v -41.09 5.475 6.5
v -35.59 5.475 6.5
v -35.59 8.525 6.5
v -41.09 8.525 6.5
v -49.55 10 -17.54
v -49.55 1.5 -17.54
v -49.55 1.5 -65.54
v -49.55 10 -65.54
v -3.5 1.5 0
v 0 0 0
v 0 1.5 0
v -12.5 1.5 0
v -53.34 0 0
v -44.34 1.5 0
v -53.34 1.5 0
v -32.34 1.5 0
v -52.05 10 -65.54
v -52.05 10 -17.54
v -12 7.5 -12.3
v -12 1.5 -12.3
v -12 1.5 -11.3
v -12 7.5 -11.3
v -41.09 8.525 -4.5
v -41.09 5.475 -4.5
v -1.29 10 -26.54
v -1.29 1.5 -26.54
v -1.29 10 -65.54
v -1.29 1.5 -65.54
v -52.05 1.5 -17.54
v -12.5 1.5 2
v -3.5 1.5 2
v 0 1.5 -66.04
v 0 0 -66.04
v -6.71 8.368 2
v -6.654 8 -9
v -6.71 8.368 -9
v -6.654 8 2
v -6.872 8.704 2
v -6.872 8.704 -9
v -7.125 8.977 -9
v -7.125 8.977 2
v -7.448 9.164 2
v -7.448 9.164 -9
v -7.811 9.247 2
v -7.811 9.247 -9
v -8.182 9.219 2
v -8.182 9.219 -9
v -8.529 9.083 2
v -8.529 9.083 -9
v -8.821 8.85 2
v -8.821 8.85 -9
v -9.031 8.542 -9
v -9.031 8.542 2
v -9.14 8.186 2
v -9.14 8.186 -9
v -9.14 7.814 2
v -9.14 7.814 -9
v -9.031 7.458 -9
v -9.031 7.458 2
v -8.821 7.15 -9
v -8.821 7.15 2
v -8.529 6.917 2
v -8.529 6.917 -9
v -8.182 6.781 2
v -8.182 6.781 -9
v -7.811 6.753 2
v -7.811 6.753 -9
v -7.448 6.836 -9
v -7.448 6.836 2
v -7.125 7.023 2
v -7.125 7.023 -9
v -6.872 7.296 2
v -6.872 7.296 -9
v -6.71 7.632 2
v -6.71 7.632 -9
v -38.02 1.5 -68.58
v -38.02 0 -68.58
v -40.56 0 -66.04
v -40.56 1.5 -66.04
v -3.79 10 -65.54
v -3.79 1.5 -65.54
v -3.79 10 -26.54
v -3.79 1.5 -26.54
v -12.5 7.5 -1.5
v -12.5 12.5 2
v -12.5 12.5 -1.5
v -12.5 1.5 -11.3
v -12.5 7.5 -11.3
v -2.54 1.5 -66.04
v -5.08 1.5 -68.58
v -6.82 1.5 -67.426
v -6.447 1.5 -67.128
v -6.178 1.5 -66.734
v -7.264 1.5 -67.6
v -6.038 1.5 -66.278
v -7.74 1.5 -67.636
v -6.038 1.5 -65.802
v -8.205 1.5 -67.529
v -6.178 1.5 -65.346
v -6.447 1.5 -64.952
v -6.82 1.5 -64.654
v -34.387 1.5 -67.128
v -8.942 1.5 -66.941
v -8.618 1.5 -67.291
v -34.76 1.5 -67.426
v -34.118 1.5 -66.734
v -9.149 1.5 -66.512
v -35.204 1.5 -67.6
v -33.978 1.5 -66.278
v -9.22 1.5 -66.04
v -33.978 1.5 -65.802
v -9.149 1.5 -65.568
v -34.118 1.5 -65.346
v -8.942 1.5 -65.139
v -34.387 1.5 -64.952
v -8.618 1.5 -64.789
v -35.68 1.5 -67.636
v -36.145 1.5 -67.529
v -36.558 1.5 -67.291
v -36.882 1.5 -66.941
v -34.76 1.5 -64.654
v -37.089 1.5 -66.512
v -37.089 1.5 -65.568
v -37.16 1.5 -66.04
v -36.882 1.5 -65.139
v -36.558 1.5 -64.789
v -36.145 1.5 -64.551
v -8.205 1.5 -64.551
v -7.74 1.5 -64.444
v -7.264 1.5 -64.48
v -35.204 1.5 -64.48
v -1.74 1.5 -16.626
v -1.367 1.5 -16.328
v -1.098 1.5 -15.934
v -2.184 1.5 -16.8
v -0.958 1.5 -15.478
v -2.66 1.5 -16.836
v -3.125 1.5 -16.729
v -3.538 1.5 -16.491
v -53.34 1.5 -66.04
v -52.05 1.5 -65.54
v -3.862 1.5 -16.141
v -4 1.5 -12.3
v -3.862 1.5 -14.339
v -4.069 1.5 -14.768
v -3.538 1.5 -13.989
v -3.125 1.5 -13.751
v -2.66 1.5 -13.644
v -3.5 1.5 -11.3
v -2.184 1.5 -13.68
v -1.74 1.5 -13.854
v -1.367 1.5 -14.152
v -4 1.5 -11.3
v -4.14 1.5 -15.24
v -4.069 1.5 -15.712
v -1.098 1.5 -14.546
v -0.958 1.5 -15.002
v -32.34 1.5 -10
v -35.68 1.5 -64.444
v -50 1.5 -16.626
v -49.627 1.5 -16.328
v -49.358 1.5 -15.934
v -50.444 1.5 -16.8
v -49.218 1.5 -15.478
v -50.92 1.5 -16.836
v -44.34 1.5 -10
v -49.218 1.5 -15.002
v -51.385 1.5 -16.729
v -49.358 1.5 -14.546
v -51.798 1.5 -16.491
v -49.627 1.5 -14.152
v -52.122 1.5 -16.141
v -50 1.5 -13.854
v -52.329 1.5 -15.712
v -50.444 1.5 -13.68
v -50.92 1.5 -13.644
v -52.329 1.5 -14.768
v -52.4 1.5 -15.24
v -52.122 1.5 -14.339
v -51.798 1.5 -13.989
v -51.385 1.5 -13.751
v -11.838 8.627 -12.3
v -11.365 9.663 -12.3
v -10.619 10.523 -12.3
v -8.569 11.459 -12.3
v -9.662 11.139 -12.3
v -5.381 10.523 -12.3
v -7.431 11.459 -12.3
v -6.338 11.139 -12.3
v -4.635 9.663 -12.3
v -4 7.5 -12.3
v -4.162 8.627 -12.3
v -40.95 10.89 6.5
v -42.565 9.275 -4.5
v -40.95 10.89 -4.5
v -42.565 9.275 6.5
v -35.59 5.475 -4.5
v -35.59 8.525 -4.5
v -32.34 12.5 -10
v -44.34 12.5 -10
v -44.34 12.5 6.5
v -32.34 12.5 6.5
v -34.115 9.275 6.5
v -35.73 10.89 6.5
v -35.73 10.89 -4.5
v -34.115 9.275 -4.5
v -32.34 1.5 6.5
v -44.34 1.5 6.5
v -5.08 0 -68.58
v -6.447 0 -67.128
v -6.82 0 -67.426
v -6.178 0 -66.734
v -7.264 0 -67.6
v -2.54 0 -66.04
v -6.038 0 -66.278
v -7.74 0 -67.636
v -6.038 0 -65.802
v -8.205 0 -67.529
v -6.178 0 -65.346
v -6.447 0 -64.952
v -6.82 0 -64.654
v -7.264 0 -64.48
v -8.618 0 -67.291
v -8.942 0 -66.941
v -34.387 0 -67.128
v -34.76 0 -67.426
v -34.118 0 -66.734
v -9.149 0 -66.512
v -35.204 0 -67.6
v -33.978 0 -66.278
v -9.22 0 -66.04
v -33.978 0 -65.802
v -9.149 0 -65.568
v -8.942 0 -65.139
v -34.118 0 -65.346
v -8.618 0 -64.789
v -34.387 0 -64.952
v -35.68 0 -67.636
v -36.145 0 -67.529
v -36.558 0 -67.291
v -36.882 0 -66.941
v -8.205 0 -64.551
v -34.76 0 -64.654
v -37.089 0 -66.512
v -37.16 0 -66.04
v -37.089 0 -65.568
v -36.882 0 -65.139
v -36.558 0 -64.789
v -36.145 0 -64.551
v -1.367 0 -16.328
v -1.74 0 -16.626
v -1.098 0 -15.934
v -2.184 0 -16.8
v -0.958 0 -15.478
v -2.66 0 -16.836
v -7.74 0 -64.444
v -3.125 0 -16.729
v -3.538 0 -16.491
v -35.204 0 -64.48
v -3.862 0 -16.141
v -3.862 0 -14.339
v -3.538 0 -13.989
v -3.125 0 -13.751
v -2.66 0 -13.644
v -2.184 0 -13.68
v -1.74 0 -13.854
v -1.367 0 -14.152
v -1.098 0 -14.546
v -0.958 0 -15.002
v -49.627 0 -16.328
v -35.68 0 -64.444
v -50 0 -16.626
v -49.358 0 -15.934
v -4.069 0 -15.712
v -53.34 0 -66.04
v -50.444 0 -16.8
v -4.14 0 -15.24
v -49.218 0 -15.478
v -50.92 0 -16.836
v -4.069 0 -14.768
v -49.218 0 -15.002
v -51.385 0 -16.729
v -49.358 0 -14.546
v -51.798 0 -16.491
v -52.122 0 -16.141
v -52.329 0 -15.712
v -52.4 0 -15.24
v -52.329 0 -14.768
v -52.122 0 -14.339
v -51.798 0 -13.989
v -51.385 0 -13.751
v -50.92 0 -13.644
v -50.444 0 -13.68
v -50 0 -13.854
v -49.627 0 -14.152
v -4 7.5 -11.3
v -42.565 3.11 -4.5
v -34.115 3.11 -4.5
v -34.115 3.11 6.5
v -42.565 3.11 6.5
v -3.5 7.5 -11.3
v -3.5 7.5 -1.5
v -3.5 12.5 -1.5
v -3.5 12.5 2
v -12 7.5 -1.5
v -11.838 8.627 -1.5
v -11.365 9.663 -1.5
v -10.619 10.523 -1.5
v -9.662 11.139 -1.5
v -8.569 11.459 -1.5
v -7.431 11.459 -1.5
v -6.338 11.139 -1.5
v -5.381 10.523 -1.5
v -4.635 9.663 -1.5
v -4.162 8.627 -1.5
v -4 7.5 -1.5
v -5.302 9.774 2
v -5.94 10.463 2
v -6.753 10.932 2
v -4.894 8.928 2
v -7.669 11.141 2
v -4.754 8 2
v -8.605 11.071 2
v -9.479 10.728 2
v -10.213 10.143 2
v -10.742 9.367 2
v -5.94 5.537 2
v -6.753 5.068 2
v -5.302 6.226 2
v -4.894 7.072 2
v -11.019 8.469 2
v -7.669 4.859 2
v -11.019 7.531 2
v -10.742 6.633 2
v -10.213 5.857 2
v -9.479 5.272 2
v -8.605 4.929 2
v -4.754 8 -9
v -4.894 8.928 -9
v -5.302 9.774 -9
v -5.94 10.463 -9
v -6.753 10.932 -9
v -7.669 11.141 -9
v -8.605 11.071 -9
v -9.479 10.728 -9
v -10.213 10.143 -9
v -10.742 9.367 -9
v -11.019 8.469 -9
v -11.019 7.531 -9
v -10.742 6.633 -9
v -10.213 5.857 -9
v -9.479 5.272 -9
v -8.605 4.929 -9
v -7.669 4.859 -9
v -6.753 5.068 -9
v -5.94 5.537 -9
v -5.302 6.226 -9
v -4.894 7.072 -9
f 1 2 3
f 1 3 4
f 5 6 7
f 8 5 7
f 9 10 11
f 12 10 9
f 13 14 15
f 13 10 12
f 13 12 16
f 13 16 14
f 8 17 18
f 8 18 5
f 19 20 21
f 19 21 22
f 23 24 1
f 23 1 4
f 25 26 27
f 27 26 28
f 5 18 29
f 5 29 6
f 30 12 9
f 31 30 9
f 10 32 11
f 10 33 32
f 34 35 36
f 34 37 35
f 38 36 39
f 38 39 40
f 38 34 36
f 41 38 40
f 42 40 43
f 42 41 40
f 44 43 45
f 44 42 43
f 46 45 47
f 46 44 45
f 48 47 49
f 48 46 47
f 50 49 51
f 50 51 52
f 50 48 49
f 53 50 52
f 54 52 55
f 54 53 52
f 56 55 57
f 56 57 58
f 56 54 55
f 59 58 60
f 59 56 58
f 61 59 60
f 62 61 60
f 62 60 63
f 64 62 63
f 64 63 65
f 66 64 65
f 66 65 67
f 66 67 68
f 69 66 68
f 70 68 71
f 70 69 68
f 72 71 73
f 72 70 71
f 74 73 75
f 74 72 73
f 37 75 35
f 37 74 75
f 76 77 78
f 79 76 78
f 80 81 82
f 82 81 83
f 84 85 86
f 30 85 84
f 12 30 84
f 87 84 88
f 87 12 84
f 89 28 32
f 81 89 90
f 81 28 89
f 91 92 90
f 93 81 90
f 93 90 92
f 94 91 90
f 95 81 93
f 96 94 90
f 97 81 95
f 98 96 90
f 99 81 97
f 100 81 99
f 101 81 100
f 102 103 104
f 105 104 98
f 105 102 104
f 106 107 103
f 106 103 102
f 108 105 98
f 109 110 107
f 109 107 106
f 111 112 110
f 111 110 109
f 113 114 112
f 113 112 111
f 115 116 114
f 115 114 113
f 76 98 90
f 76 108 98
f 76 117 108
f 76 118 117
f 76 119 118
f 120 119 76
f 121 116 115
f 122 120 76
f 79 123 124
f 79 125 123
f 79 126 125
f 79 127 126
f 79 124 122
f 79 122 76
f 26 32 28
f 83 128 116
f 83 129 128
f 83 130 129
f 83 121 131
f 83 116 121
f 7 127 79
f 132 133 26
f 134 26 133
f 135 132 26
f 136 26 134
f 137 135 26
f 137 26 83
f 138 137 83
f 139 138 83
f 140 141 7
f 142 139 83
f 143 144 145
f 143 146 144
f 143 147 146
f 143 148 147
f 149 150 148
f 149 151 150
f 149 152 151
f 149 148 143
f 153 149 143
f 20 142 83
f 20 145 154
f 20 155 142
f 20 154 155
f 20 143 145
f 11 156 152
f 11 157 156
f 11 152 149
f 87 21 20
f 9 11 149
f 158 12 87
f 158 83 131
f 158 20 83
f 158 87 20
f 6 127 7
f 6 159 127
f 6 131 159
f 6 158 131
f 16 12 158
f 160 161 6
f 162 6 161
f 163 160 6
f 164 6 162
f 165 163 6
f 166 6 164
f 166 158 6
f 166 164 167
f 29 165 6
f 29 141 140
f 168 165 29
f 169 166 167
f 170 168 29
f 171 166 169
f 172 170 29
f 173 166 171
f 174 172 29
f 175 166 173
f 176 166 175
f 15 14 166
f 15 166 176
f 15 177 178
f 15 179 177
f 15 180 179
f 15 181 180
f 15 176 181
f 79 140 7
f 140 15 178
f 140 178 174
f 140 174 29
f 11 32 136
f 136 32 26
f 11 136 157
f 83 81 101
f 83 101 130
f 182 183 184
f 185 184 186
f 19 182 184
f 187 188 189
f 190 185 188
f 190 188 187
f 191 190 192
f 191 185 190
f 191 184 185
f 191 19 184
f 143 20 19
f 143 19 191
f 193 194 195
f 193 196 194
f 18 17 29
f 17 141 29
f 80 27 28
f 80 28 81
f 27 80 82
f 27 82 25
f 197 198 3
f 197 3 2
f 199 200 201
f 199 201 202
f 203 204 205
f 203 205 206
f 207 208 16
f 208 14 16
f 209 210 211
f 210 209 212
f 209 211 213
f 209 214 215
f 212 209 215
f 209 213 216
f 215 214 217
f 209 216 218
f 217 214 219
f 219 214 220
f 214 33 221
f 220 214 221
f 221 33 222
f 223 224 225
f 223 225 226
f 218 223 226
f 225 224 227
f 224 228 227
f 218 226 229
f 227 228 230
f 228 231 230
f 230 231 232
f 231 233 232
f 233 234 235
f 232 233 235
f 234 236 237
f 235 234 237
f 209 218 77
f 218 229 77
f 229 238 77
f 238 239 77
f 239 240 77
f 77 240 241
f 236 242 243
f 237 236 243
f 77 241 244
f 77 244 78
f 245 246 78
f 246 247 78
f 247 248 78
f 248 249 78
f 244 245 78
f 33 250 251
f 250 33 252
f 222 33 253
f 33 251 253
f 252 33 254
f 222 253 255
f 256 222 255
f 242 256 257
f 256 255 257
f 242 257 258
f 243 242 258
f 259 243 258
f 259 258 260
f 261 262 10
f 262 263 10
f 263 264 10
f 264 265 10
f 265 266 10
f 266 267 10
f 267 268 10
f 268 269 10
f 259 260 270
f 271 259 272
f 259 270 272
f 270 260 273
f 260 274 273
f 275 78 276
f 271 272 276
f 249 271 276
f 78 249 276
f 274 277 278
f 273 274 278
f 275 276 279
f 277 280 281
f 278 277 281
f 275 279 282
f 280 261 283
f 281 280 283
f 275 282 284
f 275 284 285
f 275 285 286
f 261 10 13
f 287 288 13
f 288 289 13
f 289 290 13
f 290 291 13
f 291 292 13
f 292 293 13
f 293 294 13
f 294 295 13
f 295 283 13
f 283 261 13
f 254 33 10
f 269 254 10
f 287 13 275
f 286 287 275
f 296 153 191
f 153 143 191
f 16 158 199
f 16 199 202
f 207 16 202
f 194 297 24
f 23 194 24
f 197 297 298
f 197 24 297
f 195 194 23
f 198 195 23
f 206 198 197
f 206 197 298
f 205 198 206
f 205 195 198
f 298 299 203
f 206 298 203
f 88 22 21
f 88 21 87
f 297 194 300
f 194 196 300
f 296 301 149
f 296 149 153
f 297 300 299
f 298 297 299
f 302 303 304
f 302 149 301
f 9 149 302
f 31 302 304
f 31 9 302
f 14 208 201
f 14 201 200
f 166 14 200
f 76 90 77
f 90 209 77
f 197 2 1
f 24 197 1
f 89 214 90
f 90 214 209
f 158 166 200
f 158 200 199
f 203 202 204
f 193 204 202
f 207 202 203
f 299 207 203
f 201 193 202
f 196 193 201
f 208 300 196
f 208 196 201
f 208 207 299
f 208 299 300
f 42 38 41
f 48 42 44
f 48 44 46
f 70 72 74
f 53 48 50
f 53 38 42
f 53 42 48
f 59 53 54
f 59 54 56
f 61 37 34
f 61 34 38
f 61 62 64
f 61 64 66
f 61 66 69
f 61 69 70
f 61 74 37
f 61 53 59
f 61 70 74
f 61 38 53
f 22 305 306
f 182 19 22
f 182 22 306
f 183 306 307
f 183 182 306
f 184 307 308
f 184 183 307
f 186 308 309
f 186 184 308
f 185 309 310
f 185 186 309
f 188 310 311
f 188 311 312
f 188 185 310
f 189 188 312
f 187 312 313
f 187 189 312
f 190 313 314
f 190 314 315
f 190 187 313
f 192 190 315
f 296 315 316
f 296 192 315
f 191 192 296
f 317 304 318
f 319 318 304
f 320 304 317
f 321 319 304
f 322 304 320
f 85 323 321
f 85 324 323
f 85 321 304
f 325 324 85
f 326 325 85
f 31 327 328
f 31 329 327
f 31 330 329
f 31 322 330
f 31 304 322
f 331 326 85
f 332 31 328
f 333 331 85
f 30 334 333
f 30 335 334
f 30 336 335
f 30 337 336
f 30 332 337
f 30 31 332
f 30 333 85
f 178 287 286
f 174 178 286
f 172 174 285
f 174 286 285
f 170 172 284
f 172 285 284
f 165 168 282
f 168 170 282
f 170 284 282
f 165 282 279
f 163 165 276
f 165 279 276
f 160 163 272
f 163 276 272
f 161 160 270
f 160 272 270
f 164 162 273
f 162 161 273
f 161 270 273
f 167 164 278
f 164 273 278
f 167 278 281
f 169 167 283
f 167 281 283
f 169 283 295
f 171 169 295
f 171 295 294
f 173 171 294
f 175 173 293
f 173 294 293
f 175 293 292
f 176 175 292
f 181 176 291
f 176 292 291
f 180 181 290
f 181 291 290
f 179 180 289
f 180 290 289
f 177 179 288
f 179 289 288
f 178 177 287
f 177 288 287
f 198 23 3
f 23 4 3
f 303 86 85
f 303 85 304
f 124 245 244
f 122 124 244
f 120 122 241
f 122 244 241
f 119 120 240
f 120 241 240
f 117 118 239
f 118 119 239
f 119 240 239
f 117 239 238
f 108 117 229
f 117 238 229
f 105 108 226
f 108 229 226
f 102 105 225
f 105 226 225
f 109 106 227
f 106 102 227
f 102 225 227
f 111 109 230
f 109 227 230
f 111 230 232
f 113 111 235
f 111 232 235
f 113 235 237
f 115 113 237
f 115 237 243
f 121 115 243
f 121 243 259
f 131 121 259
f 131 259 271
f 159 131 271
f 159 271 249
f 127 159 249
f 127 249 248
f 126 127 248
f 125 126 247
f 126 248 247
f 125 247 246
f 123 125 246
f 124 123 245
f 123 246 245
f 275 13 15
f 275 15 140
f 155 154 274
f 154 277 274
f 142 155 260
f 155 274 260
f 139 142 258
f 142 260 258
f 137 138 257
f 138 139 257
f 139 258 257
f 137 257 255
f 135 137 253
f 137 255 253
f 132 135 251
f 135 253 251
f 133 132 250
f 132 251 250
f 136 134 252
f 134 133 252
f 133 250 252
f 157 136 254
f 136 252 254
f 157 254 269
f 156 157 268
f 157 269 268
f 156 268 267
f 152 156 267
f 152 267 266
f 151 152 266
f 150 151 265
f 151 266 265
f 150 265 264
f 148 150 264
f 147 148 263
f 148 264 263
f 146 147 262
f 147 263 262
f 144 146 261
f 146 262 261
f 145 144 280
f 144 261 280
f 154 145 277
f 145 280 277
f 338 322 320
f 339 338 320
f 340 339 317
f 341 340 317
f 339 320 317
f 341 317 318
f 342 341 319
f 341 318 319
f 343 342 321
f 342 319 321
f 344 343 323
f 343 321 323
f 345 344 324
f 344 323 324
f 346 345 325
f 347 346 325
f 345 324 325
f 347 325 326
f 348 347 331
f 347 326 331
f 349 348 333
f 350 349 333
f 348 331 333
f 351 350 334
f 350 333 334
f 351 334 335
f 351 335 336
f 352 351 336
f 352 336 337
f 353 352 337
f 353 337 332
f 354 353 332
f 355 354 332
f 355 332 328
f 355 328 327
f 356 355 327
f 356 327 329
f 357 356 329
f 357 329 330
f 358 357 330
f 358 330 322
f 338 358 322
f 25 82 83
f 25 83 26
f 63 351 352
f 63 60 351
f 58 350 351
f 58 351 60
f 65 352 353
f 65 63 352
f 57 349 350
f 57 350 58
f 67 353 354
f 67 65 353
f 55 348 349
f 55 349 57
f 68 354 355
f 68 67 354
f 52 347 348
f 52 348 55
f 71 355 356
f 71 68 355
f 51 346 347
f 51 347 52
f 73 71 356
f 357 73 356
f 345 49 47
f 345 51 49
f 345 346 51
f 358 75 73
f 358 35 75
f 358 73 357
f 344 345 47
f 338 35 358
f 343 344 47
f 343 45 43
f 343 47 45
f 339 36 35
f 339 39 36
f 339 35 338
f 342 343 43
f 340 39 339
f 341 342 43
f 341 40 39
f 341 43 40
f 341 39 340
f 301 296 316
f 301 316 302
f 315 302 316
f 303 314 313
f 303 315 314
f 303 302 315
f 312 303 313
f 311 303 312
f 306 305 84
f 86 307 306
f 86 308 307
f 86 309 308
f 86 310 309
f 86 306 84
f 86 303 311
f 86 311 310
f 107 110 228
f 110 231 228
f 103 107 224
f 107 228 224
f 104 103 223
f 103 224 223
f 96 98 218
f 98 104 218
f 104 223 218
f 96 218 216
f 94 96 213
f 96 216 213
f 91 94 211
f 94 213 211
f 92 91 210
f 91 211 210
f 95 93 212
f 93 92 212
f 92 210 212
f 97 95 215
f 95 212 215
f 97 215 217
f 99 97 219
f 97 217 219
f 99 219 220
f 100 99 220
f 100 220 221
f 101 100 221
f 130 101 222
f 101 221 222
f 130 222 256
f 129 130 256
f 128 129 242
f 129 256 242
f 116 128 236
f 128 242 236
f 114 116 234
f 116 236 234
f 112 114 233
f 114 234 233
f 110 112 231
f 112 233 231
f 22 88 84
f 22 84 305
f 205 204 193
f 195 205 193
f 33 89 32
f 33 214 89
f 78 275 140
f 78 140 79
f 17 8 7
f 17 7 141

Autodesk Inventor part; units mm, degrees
ref_plane "YZ Plane" through (0, 0, 0) normal (1, 0, 0) x (0, 1, 0)
ref_plane "XZ Plane" through (0, 0, 0) normal (0, 1, 0) x (-1, 0, 0)
ref_plane "XY Plane" through (0, 0, 0) normal (0, 0, 1) x (1, 0, 0)
sketch "Sketch1" plane through (0, 0, 0) normal (0, 1, 0) x (-1, 0, 0)
  line L0 (0, 0) -> (53.34, 0)
  line L1 (53.34, 0) -> (53.34, -66.04)
  line L2 (0, -66.04) -> (0, 0)
  circle A0 centre (50.8, -15.24) radius 1.6
  circle A1 centre (2.54, -15.24) radius 1.6
  circle A2 centre (35.56, -66.04) radius 1.6
  circle A3 centre (7.62, -66.04) radius 1.6
  line L3 (2.54, -66.04) -> (5.08, -68.58)
  line L4 (5.08, -68.58) -> (38.02, -68.58)
  line L5 (38.02, -68.58) -> (40.56, -66.04)
  line L6 (53.34, -66.04) -> (40.56, -66.04)
  line L7 (2.54, -66.04) -> (0, -66.04)
  dimension "d0" = 66.04
  dimension "d1" = 53.34
  dimension "d2" = 3.2
  dimension "d3" = 2.54
  dimension "d4" = 2.54
  dimension "d5" = 45.72
  dimension "d6" = 17.78
  dimension "d7" = 2.54
  dimension "d8" = 2.54
  dimension "d9" = 2.54
  dimension "d10" = 2.54
  dimension "d11" = 15.24
  dimension "d12" = 15.24
  dimension "d13" = 5
extrude "Extrusion1" add sketch "Sketch1" along normal blind 1.5
sketch "Sketch2" plane through (0, 1.5, 0) normal (0, 1, 0) x (1, 0, 0)
  line L0 (-44.34, 10) -> (-32.34, 10)
  line L1 (-32.34, 10) -> (-32.34, -6.5)
  line L2 (-32.34, -6.5) -> (-44.34, -6.5)
  line L3 (-44.34, -6.5) -> (-44.34, 10)
  line L4 (-53.34, 0) -> (0, 0) projected
  line L5 (-53.34, 66.04) -> (-53.34, 0) projected
  dimension "d16" = 12
  dimension "d17" = 16.5
  dimension "d18" = 6.5
  dimension "d41" = 9
extrude "Extrusion2" add sketch "Sketch2" along normal blind 11
sketch "Sketch3" plane through (-44.34, 1.5, 6.5) normal (0, 0, 1) x (1, 0, 0)
  line L0 (3.25, 7.025) -> (8.75, 7.025)
  line L1 (8.75, 7.025) -> (8.75, 3.975)
  line L2 (8.75, 3.975) -> (3.25, 3.975)
  line L3 (3.25, 3.975) -> (3.25, 7.025)
  line L4 (1.775, 1.61) -> (10.225, 1.61)
  line L5 (10.225, 1.61) -> (10.225, 7.775)
  line L6 (8.61, 9.39) -> (3.39, 9.39)
  line L7 (1.775, 7.775) -> (1.775, 1.61)
  line L8 (1.775, 7.775) -> (3.39, 9.39)
  line L9 (8.61, 9.39) -> (10.225, 7.775)
  line L10 (12, 0) -> (12, 11) projected
  line L11 (0, 11) -> (12, 11) projected
  point P0 (44.34, -1.5)
  dimension "d21" = 8.45
  dimension "d22" = 1.775
  dimension "d23" = 5.5
  dimension "d25" = 1.475
  dimension "d26" = 3.05
  dimension "d27" = 7.78
  dimension "d28" = 45
  dimension "d29" = 45
  dimension "d30" = 2.365
  dimension "d31" = 1.61
  dimension "d32" = 0.75
extrude "Extrusion3" cut sketch "Sketch3" against normal blind 11
sketch "Sketch4" plane through (0, 1.5, 0) normal (0, 1, 0) x (1, 0, 0)
  line L0 (-12.5, 12.3) -> (-3.5, 12.3)
  line L1 (-3.5, 12.3) -> (-3.5, -2)
  line L2 (-3.5, -2) -> (-12.5, -2)
  line L3 (-12.5, -2) -> (-12.5, 12.3)
  line L4 (-32.34, 0) -> (0, 0) projected
  line L5 (0, 0) -> (0, 66.04) projected
  dimension "d35" = 9
  dimension "d36" = 14.3
  dimension "d37" = 2
  dimension "d40" = 3.5
extrude "Extrusion4" add sketch "Sketch4" along normal blind 11
sketch "Sketch5" plane through (-12.5, 1.5, 2) normal (0, 0, 1) x (1, 0, 0)
  circle A0 centre (4.5957, 6.5) radius 3.15
  line L0 (0, 0) -> (9, 0) projected
  circle A1 centre (4.5957, 6.5) radius 1.25
  point P0 (12.5, -1.5)
  dimension "d42" = 6.5
  dimension "d43" = 6.3
  dimension "d44" = 2.5
extrude "Extrusion5" cut sketch "Sketch5" against normal blind 11
sketch "Sketch6" plane through (-3.5, 1.5, -12.3) normal (0, 0, -1) x (-1, 0, 0)
  line L0 (-2.56, 0) -> (0.64, 0) projected
  line L1 (0.5, 0) -> (0.5, 6)
  line L2 (1.58, 0) -> (34.52, 0) projected
  line L3 (8.5, 0) -> (8.5, 6)
  arc A0 (8.5, 6) -> (0.5, 6) centre (4.5, 6) ccw
  line L4 (9, 0) -> (9, 11) projected
  line L5 (0, 11) -> (9, 11) projected
  line L6 (0, 0) -> (0, 11) projected
  line L7 (9, 0) -> (0, 0) projected
  line L8 (9, 0) -> (9, 11) projected
  line L9 (0, 11) -> (9, 11) projected
  line L10 (0, 0) -> (0, 11) projected
  point P0 (-3.5, -1.5)
  dimension "d47" = 8
  dimension "d48" = 8
  dimension "d49" = 0.5
  dimension "d50" = 1
  dimension "d51" = 4.5
extrude "Extrusion6" cut sketch "Sketch6" against normal blind 1 contours L6 L5 L4 L2 L3 A0 L1 L0
sketch "Sketch7" plane through (-3.5, 1.5, -11.3) normal (0, 0, -1) x (-1, 0, 0)
  arc A0 (8.5, 6) -> (0.5, 6) centre (4.5, 6) ccw projected
  arc A1 (8.5, 6) -> (0.5, 6) centre (4.5, 6) ccw projected
  line L0 (0.5, 6) -> (0, 6)
  line L1 (0, 0) -> (0, 11) projected
  line L2 (0, 6) -> (0, 11)
  line L3 (0, 11) -> (9, 11) projected
  line L4 (9, 11) -> (0, 11)
  line L5 (9, 11) -> (9, 6)
  line L6 (8.5, 0) -> (8.5, 6) projected
  line L7 (9, 6) -> (8.5, 6)
  point P0 (-3.5, -1.5)
extrude "Extrusion7" cut sketch "Sketch7" against normal blind 9.8
sketch "Sketch8" plane through (0, 1.5, 0) normal (0, 1, 0) x (1, 0, 0)
  line L0 (-3.79, 26.54) -> (-1.29, 26.54)
  line L1 (-1.29, 26.54) -> (-1.29, 65.54)
  line L2 (-1.29, 65.54) -> (-3.79, 65.54)
  line L3 (-3.79, 65.54) -> (-3.79, 26.54)
  line L4 (-52.05, 17.54) -> (-49.55, 17.54)
  line L5 (-49.55, 17.54) -> (-49.55, 65.54)
  line L6 (-49.55, 65.54) -> (-52.05, 65.54)
  line L7 (-52.05, 65.54) -> (-52.05, 17.54)
  circle A0 centre (-50.8, 15.24) radius 1.6 projected
  circle A1 centre (-2.54, 15.24) radius 1.6 projected
  line L8 (0, 66.04) -> (-2.54, 66.04) projected
  line L9 (-40.56, 66.04) -> (-53.34, 66.04) projected
  point P0 (0, 0)
  dimension "d56" = 2.5
  dimension "d57" = 2.5
  dimension "d58" = 39
  dimension "d59" = 48
  dimension "d60" = 1.25
  dimension "d61" = 1.25
  dimension "d62" = 0.5
  dimension "d63" = 0.5
extrude "Extrusion8" add sketch "Sketch8" along normal blind 8.5 contours L3 L2 L1 L0 | L7 L6 L5 L4
properties part number "RoughArduino"
